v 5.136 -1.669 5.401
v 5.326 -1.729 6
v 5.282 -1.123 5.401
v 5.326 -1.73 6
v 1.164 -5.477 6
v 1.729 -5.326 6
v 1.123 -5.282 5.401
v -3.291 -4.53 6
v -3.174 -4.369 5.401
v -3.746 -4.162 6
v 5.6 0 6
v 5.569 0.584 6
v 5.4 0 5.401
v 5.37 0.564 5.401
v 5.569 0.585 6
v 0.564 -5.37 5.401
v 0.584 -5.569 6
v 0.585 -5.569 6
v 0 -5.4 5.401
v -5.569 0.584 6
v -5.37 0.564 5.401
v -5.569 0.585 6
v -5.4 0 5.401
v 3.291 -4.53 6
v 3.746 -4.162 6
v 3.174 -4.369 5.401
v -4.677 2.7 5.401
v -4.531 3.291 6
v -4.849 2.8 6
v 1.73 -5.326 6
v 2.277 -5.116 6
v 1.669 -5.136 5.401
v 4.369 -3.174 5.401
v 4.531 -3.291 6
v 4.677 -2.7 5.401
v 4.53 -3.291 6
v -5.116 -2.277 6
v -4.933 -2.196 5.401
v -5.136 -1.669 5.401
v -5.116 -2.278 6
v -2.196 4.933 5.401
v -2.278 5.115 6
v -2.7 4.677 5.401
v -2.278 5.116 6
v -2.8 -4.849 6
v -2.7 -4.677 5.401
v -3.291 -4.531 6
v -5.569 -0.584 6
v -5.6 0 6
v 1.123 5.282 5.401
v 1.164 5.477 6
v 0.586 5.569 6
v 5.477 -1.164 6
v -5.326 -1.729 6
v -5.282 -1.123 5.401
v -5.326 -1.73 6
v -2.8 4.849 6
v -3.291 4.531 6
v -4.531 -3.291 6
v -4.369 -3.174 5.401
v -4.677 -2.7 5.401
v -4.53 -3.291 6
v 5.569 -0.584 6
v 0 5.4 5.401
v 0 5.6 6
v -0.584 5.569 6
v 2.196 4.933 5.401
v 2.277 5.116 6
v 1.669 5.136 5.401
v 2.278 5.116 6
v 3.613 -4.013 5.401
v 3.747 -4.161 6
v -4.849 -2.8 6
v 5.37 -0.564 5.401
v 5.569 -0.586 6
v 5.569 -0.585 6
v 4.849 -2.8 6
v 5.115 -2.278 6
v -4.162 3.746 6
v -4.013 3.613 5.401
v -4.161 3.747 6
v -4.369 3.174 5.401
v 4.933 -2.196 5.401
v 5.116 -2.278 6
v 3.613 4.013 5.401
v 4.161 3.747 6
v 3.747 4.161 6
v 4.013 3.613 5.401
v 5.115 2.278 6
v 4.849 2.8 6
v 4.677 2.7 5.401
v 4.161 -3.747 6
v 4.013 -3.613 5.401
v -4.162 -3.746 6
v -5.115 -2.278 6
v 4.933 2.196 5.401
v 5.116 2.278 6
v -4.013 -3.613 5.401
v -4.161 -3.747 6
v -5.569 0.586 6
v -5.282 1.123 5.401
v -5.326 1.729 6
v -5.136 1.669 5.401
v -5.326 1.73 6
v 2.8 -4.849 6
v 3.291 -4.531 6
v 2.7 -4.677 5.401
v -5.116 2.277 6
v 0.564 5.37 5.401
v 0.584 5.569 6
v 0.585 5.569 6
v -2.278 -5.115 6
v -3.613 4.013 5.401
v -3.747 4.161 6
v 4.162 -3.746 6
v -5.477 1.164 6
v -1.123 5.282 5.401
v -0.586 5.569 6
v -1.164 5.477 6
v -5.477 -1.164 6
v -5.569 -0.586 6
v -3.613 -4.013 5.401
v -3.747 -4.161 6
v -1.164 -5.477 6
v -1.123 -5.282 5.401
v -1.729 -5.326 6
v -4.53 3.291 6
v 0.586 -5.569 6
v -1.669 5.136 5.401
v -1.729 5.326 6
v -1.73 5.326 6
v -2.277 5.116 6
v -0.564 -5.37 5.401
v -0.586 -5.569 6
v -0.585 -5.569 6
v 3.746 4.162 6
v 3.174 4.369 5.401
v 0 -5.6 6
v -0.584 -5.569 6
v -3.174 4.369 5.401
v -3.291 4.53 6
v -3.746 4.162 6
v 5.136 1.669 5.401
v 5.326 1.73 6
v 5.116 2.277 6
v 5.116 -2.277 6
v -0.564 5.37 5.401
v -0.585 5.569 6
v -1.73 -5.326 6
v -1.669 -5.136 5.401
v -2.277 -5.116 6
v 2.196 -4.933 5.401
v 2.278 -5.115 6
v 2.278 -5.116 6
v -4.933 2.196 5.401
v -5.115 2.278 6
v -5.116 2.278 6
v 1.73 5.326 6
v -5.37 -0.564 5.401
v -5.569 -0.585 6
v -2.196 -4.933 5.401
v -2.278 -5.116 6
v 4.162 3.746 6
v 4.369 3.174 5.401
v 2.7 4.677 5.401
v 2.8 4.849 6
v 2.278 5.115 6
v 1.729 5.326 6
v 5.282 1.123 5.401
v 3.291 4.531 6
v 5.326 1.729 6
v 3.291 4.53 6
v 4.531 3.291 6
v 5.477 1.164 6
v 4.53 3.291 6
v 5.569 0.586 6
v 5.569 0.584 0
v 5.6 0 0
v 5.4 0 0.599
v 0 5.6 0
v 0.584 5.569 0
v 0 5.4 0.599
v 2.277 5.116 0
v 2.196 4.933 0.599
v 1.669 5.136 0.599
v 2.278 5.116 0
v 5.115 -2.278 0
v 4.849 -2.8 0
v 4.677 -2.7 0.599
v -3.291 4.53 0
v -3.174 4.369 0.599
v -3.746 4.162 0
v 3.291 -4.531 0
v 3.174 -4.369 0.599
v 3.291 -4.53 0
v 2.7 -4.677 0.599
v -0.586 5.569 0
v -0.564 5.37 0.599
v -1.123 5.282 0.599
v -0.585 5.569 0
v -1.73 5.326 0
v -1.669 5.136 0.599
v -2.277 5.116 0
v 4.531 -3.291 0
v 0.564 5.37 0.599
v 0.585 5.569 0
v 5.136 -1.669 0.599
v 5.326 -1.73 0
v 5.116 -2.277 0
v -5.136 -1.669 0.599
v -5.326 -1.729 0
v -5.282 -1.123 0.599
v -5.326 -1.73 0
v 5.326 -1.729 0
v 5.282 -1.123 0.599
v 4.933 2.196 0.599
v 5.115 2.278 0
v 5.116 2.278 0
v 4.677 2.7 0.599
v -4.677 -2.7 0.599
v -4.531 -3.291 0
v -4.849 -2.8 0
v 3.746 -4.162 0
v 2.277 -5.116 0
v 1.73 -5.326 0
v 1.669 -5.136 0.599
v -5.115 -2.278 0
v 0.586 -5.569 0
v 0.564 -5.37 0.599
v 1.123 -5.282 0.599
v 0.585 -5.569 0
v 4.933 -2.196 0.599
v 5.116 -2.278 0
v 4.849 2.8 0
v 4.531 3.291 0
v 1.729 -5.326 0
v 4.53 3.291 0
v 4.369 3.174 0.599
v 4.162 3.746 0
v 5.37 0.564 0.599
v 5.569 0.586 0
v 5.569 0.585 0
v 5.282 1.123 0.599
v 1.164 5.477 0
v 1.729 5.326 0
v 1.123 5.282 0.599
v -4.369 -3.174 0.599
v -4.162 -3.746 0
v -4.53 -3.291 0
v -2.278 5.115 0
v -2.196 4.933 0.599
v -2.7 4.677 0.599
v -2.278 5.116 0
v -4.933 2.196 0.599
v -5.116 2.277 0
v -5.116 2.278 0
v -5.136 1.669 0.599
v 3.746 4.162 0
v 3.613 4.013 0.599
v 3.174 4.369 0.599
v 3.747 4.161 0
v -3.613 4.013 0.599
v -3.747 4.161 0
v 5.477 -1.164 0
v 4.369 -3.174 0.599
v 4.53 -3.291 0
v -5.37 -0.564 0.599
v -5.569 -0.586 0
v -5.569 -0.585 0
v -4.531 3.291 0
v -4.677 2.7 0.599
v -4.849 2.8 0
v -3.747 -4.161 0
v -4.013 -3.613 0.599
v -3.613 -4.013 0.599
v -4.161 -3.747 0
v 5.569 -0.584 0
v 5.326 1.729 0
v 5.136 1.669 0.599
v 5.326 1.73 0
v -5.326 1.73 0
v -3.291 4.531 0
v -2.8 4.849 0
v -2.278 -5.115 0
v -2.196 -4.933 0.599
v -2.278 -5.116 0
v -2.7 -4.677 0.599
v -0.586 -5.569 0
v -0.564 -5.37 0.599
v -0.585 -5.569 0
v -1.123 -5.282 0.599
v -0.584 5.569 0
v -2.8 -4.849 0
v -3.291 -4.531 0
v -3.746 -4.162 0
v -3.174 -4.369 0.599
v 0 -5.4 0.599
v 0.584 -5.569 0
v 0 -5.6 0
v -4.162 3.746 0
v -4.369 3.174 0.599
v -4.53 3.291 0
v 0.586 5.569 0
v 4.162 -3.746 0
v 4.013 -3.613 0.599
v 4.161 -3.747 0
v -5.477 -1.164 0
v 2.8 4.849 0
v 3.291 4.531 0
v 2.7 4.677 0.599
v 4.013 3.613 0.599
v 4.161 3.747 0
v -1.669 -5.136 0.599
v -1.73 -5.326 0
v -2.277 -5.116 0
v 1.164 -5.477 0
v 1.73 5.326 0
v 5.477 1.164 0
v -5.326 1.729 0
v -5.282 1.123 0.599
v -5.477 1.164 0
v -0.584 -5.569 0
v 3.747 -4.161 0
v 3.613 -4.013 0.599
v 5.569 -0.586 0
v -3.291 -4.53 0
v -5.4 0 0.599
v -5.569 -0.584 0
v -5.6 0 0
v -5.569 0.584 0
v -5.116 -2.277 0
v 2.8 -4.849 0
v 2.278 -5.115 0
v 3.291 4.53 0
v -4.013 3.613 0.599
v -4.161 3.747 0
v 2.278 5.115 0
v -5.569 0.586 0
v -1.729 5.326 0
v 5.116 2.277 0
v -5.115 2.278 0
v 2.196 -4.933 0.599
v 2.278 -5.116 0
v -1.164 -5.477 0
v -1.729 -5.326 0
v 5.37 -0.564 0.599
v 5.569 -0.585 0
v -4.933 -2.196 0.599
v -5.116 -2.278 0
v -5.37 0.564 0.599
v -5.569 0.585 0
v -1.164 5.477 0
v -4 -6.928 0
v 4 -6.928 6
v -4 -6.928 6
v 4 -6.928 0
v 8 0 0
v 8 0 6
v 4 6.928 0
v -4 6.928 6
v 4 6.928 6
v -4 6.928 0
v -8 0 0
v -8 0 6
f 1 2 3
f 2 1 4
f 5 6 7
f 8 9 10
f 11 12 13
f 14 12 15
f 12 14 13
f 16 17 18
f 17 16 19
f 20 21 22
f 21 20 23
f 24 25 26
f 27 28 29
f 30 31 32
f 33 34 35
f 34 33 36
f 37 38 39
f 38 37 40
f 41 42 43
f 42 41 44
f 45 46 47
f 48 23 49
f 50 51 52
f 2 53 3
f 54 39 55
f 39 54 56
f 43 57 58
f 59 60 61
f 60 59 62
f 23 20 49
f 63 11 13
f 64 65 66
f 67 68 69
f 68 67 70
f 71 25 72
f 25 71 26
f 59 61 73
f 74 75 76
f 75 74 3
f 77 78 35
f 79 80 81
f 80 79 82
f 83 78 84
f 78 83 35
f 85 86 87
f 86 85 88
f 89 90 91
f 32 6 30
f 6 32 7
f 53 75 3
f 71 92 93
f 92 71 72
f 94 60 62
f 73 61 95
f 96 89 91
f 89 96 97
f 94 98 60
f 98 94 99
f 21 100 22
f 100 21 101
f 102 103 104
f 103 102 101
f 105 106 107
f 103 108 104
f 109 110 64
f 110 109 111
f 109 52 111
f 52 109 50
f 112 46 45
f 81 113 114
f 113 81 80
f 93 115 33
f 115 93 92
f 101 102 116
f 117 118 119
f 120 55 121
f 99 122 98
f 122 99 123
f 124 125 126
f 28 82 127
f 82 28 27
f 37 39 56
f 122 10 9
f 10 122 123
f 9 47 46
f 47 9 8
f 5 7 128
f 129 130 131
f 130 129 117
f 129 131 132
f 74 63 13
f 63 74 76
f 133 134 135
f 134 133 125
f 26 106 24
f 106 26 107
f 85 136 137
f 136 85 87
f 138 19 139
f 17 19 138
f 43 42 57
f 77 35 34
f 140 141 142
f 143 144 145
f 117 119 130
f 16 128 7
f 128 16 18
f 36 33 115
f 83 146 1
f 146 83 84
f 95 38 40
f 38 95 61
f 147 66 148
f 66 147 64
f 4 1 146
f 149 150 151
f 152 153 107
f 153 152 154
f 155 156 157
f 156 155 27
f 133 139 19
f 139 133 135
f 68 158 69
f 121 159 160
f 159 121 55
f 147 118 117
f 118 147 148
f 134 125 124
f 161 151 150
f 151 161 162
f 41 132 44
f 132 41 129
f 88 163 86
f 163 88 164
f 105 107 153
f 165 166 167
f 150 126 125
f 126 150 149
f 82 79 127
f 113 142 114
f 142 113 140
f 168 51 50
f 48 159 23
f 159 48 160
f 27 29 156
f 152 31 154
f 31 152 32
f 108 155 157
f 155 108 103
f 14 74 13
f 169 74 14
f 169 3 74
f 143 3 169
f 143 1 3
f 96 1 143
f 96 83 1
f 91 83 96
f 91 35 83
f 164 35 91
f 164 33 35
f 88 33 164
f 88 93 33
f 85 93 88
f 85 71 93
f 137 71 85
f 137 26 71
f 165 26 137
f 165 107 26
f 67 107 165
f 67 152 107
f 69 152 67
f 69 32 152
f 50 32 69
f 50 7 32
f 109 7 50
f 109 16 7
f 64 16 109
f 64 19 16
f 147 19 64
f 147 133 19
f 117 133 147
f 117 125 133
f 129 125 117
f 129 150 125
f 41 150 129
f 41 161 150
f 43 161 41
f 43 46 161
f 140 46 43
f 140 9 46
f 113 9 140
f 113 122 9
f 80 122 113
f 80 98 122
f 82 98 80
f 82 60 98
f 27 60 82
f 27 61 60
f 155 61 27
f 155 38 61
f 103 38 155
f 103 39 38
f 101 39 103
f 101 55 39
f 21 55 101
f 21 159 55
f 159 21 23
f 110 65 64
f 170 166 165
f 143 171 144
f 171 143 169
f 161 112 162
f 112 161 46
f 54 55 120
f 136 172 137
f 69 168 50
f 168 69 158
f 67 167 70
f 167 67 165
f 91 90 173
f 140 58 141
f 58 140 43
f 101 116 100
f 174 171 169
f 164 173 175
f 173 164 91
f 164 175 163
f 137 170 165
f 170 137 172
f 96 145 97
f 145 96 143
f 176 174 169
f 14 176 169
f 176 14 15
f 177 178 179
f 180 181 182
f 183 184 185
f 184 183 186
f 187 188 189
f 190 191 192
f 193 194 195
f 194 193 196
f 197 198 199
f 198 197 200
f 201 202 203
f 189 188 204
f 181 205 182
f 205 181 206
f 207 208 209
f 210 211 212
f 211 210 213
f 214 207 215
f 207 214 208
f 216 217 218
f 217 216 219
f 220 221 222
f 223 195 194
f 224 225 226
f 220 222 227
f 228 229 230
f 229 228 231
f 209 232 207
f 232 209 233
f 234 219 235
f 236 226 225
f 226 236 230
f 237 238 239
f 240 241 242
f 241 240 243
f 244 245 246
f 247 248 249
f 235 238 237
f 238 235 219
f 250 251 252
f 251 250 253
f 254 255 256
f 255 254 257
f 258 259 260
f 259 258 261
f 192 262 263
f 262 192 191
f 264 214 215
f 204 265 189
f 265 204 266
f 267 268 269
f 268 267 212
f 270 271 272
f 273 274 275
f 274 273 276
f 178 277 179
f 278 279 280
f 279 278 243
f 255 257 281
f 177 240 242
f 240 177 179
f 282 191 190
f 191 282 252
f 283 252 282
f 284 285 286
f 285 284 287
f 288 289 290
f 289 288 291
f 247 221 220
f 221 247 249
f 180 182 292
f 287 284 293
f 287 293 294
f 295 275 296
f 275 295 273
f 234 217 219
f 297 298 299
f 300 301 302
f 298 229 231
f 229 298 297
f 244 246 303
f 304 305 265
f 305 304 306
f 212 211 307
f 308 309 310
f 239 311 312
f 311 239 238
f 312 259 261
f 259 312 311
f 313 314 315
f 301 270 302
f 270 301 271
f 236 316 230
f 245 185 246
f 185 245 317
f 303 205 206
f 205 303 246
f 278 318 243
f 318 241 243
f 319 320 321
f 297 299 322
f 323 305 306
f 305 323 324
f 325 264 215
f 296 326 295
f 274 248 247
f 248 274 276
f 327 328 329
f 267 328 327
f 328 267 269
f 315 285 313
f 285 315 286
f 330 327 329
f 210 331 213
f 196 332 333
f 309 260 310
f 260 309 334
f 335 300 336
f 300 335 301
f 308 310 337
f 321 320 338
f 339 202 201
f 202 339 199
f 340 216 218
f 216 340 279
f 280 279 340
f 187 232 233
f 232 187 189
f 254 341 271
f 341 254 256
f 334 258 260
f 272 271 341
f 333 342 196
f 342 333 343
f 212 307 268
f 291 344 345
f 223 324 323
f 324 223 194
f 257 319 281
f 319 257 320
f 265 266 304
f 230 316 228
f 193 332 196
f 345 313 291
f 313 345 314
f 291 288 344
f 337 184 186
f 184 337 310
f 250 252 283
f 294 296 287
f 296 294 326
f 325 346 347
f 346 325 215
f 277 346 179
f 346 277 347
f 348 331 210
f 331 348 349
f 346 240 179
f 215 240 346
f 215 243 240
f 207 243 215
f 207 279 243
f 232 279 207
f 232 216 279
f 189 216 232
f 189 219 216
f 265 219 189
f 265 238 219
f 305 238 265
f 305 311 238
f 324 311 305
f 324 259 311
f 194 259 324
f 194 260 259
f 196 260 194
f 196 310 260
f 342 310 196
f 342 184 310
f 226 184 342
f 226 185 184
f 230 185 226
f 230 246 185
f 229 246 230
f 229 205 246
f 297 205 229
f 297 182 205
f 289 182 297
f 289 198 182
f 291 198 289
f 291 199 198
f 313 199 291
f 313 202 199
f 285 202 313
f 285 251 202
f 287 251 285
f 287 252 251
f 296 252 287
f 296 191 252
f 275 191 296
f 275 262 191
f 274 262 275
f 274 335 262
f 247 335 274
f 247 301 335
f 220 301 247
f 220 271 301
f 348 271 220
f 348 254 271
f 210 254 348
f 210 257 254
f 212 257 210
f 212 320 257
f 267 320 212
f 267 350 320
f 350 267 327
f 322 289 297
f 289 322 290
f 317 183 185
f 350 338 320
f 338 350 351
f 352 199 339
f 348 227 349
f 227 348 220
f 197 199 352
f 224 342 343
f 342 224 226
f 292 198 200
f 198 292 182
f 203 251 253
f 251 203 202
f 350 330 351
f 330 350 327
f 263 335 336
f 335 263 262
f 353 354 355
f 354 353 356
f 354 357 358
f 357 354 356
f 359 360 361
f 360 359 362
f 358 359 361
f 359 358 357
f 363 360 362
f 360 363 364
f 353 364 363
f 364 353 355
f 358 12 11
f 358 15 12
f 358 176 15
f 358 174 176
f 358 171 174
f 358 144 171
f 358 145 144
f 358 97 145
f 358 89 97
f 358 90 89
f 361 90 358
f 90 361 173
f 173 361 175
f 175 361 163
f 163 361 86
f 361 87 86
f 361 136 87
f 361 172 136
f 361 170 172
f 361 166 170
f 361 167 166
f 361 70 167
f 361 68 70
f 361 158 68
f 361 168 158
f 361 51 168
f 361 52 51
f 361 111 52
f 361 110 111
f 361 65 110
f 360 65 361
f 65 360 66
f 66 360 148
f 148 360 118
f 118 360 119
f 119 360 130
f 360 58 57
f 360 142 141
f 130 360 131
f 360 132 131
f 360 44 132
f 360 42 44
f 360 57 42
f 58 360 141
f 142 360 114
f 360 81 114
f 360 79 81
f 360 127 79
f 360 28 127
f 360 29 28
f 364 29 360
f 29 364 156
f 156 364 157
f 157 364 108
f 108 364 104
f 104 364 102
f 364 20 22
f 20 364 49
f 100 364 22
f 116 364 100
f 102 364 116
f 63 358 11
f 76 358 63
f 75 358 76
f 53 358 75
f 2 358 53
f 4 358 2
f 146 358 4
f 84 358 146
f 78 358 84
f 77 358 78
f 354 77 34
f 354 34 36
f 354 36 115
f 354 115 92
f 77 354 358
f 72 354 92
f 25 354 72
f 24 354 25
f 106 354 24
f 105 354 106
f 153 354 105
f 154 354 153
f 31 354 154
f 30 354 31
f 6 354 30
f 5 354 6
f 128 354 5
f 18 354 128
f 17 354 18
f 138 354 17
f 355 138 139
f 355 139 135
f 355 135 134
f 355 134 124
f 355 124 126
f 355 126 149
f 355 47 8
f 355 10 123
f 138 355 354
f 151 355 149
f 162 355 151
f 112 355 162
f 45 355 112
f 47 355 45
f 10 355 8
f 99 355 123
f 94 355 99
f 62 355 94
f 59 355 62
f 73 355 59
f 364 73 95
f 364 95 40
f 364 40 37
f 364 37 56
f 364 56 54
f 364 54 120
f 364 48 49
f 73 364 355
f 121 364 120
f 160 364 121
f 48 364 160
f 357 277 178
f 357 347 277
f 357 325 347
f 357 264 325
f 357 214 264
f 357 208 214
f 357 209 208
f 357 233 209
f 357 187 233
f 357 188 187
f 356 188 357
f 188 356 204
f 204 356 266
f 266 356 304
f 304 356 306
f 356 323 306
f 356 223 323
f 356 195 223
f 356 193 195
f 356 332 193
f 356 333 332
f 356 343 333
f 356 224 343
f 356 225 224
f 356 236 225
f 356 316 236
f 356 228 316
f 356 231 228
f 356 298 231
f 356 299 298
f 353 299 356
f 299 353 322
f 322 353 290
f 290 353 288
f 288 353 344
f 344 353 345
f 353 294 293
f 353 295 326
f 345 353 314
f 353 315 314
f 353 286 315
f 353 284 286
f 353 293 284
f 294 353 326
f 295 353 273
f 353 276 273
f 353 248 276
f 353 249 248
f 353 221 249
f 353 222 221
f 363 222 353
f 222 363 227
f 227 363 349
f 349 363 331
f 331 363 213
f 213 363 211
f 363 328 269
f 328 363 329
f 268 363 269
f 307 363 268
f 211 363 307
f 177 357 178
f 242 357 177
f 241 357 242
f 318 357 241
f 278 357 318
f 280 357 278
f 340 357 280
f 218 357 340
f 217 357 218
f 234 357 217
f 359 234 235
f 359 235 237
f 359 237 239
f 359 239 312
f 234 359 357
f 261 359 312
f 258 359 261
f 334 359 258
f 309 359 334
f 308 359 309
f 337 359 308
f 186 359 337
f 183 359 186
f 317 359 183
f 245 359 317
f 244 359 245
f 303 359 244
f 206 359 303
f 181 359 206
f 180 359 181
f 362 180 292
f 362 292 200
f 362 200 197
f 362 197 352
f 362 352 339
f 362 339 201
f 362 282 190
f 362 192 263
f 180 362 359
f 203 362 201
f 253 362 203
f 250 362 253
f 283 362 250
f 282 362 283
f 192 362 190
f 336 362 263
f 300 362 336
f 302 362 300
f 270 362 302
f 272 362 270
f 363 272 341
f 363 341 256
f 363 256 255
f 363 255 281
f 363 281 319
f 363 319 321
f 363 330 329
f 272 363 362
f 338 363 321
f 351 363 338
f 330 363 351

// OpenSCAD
use <threads-library-by-cuiso-v1.scad>

difference(){
cylinder(d=16,h=6,$fn=6);
thread_for_nut_fullparm(diameter=10, length=6, pitch=2, usrclearance=0.2);
}
